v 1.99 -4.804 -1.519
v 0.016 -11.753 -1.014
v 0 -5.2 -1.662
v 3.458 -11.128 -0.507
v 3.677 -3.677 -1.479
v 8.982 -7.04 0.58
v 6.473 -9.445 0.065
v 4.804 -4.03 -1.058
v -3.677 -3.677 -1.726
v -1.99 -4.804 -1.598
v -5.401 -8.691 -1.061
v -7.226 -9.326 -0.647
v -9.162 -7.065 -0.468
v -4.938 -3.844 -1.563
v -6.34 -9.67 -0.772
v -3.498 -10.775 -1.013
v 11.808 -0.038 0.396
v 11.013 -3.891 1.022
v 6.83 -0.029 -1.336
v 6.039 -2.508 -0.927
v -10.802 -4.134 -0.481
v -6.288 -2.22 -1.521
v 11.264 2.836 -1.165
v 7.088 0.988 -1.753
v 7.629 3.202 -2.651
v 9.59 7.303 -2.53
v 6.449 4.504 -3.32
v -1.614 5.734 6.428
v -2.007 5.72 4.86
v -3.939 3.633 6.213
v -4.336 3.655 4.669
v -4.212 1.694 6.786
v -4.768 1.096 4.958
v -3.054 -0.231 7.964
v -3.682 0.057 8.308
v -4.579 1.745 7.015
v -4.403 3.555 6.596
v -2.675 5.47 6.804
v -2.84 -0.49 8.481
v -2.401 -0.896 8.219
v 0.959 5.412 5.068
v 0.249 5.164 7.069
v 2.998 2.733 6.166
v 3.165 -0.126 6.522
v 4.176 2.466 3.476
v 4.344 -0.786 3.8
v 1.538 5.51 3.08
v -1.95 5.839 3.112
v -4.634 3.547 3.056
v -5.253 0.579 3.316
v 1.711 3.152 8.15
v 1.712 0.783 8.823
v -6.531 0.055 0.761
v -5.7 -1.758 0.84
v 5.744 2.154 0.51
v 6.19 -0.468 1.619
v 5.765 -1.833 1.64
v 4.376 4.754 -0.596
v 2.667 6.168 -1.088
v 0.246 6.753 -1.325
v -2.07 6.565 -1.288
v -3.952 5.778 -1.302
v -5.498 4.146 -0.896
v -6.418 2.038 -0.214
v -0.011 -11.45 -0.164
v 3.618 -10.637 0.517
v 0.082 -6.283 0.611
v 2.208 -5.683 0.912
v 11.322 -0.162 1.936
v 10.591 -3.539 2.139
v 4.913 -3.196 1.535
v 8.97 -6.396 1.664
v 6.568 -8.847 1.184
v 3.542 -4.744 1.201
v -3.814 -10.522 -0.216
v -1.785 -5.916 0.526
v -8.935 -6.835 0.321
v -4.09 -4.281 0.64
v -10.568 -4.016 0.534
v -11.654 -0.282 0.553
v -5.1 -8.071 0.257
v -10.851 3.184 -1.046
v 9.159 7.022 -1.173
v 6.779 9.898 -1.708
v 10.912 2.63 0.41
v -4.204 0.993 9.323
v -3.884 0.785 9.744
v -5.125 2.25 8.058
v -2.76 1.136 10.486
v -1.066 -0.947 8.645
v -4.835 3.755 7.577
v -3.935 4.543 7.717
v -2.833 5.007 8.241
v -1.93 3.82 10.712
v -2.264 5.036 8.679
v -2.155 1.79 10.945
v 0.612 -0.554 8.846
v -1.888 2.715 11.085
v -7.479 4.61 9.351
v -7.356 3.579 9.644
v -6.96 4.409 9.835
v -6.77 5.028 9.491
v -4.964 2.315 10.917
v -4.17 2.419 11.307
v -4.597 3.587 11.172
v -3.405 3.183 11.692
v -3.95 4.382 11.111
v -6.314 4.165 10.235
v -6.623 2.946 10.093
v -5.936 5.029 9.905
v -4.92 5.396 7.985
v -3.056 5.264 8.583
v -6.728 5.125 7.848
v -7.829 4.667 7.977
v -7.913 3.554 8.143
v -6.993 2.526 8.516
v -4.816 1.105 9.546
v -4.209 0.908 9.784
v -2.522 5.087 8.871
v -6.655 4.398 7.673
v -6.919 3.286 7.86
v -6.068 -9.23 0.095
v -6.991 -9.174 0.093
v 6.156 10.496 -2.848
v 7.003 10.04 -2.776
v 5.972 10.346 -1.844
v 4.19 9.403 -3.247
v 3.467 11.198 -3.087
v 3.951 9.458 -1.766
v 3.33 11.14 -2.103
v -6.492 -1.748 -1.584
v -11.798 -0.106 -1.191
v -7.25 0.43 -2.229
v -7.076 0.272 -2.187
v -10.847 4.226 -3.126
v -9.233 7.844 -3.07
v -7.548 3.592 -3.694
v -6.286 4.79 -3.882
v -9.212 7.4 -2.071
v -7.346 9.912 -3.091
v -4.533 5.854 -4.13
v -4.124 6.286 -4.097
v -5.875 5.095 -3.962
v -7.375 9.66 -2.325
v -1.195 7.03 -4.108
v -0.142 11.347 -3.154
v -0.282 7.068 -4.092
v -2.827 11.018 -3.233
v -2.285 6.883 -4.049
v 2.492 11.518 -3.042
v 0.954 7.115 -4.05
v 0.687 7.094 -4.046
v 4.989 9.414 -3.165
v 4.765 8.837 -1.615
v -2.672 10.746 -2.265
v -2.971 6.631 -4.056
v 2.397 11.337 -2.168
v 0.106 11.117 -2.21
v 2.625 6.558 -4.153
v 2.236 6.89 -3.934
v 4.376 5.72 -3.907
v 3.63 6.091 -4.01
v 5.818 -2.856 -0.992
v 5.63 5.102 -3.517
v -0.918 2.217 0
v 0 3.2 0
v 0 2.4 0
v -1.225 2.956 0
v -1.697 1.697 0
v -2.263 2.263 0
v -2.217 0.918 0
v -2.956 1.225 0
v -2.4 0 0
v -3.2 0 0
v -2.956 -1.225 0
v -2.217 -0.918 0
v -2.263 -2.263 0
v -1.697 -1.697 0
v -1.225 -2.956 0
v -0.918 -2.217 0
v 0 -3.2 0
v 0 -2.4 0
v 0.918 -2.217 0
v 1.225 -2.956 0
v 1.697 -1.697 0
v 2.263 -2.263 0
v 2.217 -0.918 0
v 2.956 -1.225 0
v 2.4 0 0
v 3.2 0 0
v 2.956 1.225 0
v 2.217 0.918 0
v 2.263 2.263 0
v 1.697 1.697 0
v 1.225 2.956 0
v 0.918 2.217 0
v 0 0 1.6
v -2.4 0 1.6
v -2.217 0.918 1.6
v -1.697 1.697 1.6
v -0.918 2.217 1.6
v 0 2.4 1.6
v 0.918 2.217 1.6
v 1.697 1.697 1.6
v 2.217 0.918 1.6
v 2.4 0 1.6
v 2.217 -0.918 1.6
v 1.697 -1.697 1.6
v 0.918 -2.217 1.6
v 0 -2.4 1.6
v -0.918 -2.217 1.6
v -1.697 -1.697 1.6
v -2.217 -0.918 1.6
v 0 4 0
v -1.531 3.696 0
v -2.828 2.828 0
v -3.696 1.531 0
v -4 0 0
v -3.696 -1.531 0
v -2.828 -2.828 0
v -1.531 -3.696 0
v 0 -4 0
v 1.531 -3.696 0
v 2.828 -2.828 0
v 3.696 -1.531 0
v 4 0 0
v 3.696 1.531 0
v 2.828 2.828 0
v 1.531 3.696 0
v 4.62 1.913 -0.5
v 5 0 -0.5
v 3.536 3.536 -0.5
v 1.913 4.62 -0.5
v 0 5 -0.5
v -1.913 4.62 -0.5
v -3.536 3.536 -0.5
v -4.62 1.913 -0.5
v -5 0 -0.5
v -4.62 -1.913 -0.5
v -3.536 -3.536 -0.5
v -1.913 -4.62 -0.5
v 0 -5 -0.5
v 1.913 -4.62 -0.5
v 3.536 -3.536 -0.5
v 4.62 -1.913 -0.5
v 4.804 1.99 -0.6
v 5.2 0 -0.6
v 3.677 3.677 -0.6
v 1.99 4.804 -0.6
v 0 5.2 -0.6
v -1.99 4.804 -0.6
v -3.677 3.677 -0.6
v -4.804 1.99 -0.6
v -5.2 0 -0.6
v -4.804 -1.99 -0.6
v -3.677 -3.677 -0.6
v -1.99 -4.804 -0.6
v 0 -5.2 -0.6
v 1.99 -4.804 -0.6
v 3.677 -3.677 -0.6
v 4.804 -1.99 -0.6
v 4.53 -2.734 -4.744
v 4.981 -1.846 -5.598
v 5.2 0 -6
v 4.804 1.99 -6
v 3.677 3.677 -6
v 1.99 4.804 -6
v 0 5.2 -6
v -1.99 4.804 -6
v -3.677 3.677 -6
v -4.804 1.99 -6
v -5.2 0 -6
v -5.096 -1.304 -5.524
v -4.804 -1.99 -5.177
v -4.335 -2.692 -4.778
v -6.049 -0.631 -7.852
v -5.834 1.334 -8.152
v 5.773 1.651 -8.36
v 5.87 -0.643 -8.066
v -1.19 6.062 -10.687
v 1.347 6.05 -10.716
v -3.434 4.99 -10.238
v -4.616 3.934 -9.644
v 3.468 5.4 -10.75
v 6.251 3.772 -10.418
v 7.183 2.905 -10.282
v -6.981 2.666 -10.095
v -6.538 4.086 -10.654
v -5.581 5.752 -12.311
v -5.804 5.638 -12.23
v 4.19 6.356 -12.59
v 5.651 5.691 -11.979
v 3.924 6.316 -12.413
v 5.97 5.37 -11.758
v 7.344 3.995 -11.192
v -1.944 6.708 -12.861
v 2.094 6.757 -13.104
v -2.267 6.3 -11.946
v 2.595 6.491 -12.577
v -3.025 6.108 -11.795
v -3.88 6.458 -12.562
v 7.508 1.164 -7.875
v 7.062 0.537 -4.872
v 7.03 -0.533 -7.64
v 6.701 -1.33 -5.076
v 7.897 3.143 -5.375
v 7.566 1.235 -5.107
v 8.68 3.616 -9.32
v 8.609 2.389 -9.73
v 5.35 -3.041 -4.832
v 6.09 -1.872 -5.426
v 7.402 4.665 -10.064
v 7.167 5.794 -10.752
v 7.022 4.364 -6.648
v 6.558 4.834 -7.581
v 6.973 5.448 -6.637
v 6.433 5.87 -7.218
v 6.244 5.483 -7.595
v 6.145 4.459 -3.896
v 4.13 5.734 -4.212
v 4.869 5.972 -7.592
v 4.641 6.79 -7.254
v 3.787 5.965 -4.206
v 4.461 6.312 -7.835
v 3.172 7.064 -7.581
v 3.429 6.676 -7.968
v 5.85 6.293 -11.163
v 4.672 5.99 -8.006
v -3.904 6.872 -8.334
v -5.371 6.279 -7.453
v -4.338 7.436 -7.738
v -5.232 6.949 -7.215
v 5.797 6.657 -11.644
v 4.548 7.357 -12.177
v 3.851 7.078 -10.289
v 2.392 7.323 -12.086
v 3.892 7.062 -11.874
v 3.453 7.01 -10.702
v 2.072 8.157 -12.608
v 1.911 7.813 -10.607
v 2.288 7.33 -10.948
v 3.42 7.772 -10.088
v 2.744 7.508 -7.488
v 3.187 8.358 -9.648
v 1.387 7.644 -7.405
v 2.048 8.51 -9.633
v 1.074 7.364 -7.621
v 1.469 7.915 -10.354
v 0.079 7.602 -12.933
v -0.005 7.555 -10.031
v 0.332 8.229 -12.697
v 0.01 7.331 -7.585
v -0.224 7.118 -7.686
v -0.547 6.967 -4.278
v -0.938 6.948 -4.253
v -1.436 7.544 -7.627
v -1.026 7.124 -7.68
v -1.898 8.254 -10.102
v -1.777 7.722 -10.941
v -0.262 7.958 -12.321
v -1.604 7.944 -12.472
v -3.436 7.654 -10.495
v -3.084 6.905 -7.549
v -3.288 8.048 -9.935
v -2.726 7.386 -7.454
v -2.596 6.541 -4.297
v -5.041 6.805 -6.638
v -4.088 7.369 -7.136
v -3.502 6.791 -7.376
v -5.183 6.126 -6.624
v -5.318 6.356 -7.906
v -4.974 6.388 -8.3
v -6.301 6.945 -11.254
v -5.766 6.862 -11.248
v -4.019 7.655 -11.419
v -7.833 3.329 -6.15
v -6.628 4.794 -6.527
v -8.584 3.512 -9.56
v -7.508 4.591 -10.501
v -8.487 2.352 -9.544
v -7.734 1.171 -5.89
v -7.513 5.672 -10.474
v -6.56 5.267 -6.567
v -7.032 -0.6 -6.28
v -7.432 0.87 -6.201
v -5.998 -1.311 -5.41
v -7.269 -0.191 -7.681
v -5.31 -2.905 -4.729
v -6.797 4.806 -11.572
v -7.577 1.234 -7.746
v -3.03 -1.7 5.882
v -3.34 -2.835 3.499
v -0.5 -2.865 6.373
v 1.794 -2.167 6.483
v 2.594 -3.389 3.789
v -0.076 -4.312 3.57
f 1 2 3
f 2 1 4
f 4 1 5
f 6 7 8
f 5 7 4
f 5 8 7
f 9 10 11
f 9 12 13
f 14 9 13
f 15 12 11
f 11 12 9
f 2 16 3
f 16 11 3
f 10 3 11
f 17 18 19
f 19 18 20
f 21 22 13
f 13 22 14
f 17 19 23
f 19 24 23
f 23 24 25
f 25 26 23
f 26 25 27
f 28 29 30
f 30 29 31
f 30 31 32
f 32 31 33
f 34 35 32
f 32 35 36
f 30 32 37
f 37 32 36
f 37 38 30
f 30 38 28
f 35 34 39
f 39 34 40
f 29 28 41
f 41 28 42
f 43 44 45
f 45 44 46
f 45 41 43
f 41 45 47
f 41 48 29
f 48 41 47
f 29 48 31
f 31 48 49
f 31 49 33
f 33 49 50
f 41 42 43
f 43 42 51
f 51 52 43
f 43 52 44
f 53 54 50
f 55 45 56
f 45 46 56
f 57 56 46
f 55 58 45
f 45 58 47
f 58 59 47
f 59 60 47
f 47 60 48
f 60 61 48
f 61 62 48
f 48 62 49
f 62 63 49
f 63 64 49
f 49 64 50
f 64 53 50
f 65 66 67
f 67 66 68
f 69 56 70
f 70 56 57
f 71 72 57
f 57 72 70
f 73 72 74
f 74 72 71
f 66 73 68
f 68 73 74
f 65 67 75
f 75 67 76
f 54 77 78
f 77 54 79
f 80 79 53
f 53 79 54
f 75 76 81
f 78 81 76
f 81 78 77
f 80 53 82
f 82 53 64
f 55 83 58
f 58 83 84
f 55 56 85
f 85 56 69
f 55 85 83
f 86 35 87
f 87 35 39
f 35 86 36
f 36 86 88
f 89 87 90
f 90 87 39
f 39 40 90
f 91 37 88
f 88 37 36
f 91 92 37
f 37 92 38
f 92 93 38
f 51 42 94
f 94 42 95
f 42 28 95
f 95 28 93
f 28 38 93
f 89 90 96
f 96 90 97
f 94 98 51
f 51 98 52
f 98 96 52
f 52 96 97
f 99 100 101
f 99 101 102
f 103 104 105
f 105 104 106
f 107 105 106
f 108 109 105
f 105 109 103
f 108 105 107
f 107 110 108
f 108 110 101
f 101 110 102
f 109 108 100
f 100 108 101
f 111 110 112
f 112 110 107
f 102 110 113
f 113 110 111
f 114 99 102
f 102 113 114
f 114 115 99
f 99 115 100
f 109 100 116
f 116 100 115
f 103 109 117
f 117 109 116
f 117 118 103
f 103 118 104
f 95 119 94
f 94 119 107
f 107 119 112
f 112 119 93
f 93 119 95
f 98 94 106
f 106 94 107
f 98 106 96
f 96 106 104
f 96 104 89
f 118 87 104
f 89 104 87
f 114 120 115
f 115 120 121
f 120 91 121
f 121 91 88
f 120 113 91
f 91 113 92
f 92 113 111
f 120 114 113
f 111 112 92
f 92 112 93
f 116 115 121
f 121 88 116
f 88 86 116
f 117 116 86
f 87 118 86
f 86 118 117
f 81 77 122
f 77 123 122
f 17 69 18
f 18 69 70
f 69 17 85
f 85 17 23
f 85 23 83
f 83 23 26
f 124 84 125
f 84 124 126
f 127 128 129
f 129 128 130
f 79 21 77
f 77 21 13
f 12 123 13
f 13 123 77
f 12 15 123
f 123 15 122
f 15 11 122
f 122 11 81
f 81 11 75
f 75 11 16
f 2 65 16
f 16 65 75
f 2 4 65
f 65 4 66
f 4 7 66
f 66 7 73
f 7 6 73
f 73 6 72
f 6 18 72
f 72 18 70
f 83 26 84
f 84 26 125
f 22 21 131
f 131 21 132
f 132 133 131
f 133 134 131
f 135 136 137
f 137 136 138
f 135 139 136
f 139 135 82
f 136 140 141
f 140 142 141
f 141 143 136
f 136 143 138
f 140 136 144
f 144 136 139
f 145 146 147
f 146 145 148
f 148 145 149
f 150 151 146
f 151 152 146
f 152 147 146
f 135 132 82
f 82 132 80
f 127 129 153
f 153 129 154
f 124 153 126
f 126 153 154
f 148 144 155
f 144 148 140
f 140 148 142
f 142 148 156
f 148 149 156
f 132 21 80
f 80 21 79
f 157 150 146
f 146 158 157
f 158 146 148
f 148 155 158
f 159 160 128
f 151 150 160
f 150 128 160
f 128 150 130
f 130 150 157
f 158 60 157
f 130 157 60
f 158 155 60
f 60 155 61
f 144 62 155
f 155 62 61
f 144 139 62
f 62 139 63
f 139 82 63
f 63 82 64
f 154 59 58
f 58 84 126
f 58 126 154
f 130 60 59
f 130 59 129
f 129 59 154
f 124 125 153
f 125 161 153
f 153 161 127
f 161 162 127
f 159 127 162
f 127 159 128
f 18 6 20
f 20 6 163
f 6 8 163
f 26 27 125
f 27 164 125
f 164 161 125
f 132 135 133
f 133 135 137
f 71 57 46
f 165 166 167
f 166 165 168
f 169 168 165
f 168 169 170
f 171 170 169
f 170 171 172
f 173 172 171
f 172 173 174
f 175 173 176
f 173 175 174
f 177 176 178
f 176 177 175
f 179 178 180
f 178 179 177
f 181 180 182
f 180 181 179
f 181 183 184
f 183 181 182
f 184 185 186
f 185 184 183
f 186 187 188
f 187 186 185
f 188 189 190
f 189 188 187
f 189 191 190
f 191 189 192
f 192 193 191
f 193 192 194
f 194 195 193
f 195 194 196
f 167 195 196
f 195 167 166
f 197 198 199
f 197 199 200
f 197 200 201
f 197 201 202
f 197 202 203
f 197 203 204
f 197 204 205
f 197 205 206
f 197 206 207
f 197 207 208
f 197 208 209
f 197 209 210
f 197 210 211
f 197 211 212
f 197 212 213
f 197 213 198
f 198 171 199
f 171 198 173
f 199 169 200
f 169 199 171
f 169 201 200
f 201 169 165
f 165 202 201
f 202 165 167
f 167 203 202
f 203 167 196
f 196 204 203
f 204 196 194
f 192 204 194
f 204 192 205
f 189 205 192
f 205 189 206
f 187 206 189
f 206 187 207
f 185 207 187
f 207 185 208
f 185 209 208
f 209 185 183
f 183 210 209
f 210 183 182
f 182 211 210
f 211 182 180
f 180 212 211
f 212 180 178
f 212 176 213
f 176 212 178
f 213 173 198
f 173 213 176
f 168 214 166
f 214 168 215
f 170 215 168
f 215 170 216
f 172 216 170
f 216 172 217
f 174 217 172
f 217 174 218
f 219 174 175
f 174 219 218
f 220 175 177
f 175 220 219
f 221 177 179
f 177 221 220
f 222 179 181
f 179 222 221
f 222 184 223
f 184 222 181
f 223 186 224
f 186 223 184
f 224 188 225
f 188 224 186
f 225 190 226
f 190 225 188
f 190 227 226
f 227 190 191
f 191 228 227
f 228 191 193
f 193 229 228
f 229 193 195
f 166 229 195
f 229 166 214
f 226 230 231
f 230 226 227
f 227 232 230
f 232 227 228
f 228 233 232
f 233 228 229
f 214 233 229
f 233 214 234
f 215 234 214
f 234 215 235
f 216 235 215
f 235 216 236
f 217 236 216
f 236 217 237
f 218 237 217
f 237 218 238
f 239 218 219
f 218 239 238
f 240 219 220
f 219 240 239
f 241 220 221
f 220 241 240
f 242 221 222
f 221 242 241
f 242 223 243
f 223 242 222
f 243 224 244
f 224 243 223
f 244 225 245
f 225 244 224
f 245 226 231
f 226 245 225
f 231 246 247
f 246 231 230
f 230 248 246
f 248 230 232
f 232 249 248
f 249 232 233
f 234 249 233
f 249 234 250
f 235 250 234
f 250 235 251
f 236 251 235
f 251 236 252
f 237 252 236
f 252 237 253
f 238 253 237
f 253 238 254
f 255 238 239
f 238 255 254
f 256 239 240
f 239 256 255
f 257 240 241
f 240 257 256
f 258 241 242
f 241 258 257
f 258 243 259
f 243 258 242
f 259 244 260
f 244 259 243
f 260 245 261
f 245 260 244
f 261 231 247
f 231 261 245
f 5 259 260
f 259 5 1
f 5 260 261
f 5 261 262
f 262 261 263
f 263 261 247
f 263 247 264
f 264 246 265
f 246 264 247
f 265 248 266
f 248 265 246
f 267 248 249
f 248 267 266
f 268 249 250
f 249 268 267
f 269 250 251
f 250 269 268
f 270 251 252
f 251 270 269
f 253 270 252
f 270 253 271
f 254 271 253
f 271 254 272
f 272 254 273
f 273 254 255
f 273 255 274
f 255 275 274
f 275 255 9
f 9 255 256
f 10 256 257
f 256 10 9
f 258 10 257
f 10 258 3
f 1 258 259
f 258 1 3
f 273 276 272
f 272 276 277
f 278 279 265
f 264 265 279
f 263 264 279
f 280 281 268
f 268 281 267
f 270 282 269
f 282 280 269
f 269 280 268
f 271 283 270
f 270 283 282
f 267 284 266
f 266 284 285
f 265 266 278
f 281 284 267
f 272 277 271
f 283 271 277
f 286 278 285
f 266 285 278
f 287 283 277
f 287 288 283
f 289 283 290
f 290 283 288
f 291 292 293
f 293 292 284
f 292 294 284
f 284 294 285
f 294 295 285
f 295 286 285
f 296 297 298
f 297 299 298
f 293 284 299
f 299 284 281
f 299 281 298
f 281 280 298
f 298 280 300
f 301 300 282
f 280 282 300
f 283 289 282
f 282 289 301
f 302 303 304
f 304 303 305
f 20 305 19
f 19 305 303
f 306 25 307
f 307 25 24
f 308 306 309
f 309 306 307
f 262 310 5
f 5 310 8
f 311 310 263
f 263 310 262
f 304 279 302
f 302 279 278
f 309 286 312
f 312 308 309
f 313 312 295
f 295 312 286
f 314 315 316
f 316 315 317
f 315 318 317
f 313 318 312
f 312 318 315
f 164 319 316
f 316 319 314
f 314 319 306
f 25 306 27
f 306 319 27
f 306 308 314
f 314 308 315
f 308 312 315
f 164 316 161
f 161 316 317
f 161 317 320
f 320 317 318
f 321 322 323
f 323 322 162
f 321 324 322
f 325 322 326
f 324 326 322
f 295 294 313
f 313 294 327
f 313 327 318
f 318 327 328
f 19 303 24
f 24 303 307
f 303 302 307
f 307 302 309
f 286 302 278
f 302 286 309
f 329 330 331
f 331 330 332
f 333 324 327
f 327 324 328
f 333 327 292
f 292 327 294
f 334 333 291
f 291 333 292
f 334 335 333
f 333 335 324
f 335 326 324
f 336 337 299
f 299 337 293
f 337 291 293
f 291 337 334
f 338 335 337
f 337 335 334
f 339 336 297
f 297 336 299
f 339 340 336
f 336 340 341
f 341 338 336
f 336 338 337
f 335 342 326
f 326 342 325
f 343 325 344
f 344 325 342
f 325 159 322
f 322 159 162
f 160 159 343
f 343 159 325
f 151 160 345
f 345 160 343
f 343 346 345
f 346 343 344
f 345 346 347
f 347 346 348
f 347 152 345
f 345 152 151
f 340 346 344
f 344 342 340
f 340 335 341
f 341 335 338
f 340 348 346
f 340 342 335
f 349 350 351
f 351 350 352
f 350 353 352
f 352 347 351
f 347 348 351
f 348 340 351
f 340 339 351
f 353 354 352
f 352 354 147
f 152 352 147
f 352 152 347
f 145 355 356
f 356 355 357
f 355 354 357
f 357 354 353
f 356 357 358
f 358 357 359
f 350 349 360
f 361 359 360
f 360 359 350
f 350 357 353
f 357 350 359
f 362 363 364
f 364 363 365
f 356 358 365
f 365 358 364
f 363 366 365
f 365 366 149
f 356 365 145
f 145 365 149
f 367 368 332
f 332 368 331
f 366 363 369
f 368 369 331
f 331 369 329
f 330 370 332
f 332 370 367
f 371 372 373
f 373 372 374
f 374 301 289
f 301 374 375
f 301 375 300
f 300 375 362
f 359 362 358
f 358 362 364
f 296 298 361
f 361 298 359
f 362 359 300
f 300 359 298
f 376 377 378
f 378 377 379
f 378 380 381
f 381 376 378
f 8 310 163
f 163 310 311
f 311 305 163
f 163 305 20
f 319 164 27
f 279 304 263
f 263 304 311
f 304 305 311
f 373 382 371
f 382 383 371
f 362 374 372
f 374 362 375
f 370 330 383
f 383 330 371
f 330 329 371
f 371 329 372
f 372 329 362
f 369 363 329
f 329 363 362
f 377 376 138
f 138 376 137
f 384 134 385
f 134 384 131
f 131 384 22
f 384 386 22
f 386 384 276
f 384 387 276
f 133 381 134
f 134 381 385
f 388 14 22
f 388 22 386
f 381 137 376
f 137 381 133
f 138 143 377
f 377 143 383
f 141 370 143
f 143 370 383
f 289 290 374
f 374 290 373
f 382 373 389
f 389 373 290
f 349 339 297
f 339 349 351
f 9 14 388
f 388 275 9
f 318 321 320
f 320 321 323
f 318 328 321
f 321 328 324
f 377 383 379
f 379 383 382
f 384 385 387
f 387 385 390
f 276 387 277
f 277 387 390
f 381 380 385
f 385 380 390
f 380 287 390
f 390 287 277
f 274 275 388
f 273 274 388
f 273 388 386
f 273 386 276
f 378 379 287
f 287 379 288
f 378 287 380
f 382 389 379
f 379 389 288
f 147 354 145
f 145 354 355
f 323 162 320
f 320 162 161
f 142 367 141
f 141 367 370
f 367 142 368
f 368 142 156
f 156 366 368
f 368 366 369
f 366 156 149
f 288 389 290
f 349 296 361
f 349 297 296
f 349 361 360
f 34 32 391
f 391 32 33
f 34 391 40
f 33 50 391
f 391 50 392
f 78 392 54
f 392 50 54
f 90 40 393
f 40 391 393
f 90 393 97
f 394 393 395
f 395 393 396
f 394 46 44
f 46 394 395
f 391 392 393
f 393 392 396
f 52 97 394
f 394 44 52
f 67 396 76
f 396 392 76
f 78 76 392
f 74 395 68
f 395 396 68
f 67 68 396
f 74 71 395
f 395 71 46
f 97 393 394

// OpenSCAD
use <../lib.scad>
use <s/20606s01.scad>
use <s/20606s02.scad>
use <s/20606s03.scad>
function ldraw_lib__20606p04() = [
// 0 Minifig Hair Mid-Length Scraggly with Dual Mould Reddish Brown Floppy Witch Hat
// 0 Name: 20606p04.dat
// 0 Author: Lisa Winter [LisaWinter]
// 0 !LDRAW_ORG Part UPDATE 2026-07
// 0 !LICENSE Licensed under CC BY 4.0 : see CAreadme.txt
// 
// 0 BFC CERTIFY CCW
  [0,"BFC","CERTIFY"],
  [0,"BFC","CCW"],
// 
// 0 !CATEGORY Minifig Headwear
// 0 !KEYWORDS Bricklink 20606pb04, Brickowl 229499, Colour Combination
// 0 !KEYWORDS Daily Prophet Photographer, Friends, Harry Potter
// 0 !KEYWORDS Rebrickable 20606pr0004, Set 41714, Set 75978
// 
// 0 !HISTORY 2026-07-30 [OrionP] Official Update 2026-07
// 
// 0 // Hat
// 1 70 0 0 0 1 0 0 0 1 0 0 0 1 s\20606s01.dat
  [1,70,0,0,0,1,0,0,0,1,0,0,0,1, ldraw_lib__s__20606s01()],
// 0 // Hair
// 1 16 0 0 0 1 0 0 0 1 0 0 0 1 s\20606s02.dat
  [1,16,0,0,0,1,0,0,0,1,0,0,0,1, ldraw_lib__s__20606s02()],
// 0 // Patternable area
// 1 70 0 0 0 1 0 0 0 1 0 0 0 1 s\20606s03.dat
  [1,70,0,0,0,1,0,0,0,1,0,0,0,1, ldraw_lib__s__20606s03()],
];
module ldraw_lib__20606p04(step=0, col=false, unit=2/5, alt=false, line=0.2, solid=!$preview)
    makepoly(ldraw_lib__20606p04(), step=step, col=col, unit=unit, alt=alt, line=line, solid=solid);
ldraw_lib__20606p04(line=0.2);
